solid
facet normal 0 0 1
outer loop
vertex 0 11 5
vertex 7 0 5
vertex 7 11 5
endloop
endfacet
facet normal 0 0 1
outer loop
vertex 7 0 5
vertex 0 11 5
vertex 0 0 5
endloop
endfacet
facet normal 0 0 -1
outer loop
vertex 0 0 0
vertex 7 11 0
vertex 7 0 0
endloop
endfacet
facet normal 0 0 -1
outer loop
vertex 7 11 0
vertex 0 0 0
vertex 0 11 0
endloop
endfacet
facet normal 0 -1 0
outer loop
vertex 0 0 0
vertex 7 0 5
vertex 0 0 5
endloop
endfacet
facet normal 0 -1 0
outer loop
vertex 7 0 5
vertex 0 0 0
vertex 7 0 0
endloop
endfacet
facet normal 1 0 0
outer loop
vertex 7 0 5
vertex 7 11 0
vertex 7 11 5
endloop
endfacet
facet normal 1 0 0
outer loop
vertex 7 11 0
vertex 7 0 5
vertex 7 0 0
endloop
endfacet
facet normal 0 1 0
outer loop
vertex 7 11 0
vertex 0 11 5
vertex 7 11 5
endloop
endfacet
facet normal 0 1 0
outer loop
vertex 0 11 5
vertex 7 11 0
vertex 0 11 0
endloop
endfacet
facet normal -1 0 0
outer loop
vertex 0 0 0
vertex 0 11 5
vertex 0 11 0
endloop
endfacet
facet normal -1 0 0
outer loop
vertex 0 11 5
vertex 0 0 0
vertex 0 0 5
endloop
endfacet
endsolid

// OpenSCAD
// Generated by SolidPython 1.0.1 on 2020-07-29 00:46:55


cube(size = [7, 11, 5]);
/***********************************************
*********      SolidPython code:      **********
************************************************
 
# import packages: SolidPython
from solid import *
from solid.utils import *
from itertools import chain, combinations, permutations


class Resize:

    def __init__(self, scad_file):
        self.scad_file = scad_file
        #self.scad_file = import_scad(scad_file)
        # cone/cylinder param:
        self.r1 = 0
        self.r2 = 0
        self.h = 0
        # rectangular prism param:
        self.w = 0
        self.l = 0
        # ellipse param:
        self.r = 0

    # import OpenScad code (file name corresponds to shape)


    # classify shape + parameters
    def assign(self, param1, param2, param3):
        if self.scad_file == 'cone.scad':
            self.r1 = param1
            self.r2 = param2
            self.h = param3
        elif self.scad_file == 'cylinder.scad':
            self.r1 = param1
            self.r2 = param2
            self.h = param3
        elif self.scad_file == 'rectangularPrism.scad':
            self.h = param1
            self.l = param2
            self.w = param3
        else:
            self.r = param1
            self.h = param2

    # resize parameters
    def iterate(self):
        x = range(3, 20, 2)
        i = 1
        if self.scad_file == 'cone.scad':
            tempList = list(permutations(x, 2))
            for temp in tempList:
                param1 = temp[0]
                param2 = temp[1]
                filepath = 'produced_scad_files/' + 'cone' + str(param1) + '_' + str(param2) + '_' + '.scad'
                scad_render_to_file(cylinder(h=param1, r1=param2, r2=0), filepath)

        elif self.scad_file == 'cylinder.scad':
            tempList = list(permutations(x, 3))
            for temp in tempList:
                param1 = temp[0]
                param2 = temp[1]
                filepath = 'produced_scad_files/' + 'cylinder' + str(param1) + '_' + str(param2) + '_' + '.scad'
                scad_render_to_file(cylinder(h=param1, r1=param2, r2=param2), filepath)

        elif self.scad_file == 'rectangularPrism.scad':
            tempList = list(permutations(x, 3))
            for temp in tempList:
                param1 = temp[0]
                param2 = temp[1]
                param3 = temp[2]
                filepath = 'produced_scad_files/' + 'rectangularPrism' + str(param1) + '_' + str(param2) + '_' + str(
                    param3) + '.scad'
                scad_render_to_file(cube(size=(param1, param2, param3)), filepath)

        elif self.scad_file == 'ellipse.scad':
            tempList = list(permutations(x, 4))
            for temp in tempList:
                param1 = temp[0]
                param2 = temp[1]
                param3 = temp[2]
                param4 = temp[3]
                filepath = 'produced_scad_files/' + 'ellipse' + str(param1) + '_' + str(param2) + '_' + str(param3) + '_' + str(param4) + '.scad'
                scad_render_to_file(scale([param1, param2, param3])(sphere(r=param4)), filepath)

    def render_to_scadfile(self):
        scad_render_to_file(scad, 'example.scad') 
 
************************************************/
